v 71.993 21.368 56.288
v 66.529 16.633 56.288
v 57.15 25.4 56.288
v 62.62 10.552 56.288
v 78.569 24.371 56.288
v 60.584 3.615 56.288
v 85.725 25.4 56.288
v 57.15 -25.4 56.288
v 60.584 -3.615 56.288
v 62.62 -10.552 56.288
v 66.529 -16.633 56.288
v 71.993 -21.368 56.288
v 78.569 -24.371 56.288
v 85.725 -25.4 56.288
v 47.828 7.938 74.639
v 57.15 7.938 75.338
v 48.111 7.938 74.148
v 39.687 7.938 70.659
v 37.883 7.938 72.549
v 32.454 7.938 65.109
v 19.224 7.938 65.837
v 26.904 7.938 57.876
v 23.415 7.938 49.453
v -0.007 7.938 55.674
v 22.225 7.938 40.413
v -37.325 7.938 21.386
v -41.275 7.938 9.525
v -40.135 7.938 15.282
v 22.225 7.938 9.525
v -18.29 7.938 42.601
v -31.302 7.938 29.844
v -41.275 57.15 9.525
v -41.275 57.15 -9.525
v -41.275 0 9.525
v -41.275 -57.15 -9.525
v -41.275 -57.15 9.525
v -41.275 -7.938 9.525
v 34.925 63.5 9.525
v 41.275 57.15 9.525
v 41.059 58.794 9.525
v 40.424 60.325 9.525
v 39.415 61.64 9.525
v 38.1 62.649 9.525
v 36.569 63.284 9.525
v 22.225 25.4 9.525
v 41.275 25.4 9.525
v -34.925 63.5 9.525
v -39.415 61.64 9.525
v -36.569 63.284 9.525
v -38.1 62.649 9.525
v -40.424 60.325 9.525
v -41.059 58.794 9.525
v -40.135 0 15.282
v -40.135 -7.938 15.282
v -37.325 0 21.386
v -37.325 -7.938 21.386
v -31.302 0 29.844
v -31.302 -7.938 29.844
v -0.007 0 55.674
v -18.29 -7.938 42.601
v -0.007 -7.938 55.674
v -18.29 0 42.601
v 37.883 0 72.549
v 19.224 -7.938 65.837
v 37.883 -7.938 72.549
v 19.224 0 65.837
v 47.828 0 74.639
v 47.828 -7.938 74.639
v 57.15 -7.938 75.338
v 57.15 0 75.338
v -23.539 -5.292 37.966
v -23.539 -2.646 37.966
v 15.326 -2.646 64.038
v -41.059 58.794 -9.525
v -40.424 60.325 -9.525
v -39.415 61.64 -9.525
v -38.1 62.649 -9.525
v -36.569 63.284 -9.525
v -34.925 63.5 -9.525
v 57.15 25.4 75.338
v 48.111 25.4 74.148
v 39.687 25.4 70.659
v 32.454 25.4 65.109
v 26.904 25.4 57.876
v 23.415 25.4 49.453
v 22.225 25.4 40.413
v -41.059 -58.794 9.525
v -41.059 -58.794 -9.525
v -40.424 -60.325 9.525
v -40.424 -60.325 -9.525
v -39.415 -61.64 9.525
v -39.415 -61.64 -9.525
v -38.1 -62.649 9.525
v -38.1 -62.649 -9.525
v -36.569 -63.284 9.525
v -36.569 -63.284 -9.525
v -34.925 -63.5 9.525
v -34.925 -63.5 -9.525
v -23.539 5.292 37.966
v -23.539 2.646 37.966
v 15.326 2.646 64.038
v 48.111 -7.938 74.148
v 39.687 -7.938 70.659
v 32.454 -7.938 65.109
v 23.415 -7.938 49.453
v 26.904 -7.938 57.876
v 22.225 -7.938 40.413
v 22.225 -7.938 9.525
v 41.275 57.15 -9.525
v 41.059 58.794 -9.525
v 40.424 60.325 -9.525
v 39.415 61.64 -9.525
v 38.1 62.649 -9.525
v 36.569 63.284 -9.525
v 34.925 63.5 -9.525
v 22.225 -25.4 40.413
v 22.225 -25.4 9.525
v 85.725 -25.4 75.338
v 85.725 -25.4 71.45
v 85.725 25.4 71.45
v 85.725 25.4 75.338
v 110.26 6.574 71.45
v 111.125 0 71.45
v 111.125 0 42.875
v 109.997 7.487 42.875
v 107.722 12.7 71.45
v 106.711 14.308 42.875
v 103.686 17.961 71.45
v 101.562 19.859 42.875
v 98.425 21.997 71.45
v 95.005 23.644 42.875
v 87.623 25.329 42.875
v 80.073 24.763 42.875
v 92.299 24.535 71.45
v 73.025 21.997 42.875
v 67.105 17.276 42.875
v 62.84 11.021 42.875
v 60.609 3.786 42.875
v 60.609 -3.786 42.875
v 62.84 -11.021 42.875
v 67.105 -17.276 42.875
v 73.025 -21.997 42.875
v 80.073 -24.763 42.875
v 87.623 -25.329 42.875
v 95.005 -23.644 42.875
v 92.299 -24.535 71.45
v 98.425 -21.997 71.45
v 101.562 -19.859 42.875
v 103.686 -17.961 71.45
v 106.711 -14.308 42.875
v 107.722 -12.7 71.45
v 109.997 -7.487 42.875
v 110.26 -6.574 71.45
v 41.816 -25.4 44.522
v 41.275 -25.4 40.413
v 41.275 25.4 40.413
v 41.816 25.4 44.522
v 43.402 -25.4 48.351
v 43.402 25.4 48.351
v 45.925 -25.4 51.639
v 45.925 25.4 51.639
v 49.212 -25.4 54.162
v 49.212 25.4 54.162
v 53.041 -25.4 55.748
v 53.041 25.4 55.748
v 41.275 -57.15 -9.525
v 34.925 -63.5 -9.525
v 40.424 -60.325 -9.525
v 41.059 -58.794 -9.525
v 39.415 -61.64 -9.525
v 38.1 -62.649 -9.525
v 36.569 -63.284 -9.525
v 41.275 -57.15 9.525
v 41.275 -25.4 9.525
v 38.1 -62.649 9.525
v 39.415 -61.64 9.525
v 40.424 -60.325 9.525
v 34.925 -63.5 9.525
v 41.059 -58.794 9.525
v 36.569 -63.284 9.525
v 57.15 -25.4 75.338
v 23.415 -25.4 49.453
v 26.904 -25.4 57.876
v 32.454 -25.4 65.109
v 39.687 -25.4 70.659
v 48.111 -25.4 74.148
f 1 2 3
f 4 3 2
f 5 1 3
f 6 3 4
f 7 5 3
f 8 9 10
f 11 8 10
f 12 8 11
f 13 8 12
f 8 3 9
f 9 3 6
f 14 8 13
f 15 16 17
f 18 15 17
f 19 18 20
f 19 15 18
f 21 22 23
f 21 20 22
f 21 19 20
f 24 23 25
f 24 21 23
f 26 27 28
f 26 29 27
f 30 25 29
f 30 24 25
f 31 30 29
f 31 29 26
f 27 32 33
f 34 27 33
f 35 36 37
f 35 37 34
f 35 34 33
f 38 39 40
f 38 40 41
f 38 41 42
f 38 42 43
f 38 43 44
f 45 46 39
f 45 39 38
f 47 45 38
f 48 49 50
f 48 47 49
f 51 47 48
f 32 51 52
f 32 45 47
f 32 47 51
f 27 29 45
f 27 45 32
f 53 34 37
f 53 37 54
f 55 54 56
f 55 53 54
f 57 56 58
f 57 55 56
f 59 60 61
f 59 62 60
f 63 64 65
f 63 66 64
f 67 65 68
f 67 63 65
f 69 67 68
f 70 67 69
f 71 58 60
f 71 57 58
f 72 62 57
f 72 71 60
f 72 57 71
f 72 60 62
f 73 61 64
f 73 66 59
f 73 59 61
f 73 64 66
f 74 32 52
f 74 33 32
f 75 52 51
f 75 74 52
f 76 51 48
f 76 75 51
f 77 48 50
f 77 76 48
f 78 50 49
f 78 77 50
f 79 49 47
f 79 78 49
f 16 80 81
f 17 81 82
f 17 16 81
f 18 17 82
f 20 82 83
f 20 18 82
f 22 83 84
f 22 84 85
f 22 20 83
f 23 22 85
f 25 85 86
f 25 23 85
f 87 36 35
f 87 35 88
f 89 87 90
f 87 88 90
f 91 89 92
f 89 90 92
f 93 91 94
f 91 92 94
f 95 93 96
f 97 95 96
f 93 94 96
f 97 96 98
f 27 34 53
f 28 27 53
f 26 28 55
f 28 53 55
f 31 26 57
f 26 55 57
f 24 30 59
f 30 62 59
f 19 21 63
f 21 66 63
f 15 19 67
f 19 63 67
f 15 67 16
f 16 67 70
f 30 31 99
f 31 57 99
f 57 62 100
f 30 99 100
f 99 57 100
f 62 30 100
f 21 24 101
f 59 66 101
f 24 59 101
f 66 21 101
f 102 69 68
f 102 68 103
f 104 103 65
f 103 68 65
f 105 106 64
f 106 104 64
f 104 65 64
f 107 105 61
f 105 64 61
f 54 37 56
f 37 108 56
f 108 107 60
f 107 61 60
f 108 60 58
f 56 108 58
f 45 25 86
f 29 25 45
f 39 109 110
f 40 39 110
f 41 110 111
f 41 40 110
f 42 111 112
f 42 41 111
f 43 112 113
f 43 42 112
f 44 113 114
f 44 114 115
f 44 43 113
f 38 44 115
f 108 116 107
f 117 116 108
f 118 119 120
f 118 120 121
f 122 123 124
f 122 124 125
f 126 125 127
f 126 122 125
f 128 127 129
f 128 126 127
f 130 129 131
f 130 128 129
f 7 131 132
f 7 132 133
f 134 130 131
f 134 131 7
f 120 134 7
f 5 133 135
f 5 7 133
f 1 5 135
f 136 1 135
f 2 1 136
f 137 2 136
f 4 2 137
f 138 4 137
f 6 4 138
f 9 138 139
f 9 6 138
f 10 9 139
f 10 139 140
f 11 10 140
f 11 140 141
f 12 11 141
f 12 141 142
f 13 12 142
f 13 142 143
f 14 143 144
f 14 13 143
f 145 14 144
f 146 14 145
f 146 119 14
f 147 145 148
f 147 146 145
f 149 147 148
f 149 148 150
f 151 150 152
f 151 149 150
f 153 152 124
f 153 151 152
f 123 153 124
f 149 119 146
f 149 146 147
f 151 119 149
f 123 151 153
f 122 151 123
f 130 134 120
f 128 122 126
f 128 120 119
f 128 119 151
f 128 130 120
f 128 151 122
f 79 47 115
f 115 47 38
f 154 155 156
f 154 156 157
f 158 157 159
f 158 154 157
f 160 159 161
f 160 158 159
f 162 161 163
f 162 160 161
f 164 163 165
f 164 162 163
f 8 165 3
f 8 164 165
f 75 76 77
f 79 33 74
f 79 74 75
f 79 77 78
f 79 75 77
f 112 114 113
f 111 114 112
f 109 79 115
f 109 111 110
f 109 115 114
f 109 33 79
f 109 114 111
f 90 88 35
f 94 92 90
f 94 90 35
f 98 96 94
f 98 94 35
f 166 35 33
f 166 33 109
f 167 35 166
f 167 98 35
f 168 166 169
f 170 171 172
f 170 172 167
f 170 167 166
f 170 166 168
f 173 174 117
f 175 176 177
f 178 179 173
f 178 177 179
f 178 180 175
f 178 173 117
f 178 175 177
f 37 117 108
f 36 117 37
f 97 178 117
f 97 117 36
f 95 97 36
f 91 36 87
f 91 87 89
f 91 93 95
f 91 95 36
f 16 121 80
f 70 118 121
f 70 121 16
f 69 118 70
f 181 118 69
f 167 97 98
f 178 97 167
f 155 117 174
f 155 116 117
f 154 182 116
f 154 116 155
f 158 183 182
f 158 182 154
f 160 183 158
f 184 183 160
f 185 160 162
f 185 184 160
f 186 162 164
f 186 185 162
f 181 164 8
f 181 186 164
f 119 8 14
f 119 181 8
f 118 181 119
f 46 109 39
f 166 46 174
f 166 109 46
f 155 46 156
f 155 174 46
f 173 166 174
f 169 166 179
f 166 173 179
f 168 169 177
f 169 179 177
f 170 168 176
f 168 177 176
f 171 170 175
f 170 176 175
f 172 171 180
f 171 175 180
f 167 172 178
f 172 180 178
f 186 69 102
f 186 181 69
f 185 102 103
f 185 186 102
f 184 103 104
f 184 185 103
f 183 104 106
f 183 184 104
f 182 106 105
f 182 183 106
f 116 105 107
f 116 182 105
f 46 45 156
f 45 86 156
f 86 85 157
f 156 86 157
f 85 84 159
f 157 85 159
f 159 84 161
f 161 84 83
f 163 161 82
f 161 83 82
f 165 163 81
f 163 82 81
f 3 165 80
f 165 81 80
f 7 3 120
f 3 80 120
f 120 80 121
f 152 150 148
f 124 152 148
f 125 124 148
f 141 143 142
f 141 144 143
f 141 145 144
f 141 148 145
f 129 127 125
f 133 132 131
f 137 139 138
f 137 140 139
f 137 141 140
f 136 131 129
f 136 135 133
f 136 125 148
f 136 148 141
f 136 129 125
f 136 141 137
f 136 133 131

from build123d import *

# Parameters (mm, degrees)
F1_DEPTH = 63.5
F0_W     = 25.4
F0_H     = 15.1617553278
F2_DEPTH = 25.4
F3_DEPTH = 7.9375
F5_R     = 6.35


with BuildPart() as f1:
    # F0 (on Front) → F1 (new body, symmetric)
    with BuildSketch(Plane.XZ):
        Polygon((-41.275, 9.525), (-41.275, -9.525), (41.275, -9.525), (41.275, 9.525), (22.225, 9.525), align=None)
    extrude(amount=F1_DEPTH, both=True)

    # F0 (on Front) → F2 (join, symmetric)
    with BuildSketch(Plane.XZ):
        with BuildLine():
            Line((22.225, 9.525), (41.275, 9.525))
            Line((41.275, 9.525), (41.275, 40.4134446722))
            ThreePointArc((41.275, 40.4134446722), (45.9246798487, 51.6387648236), (57.15, 56.2884446722))
            Line((57.15, 56.2884446722), (60.325, 56.2884446722))
            Line((60.325, 56.2884446722), (60.325, 71.4502))
            Line((60.325, 71.4502), (85.725, 71.4502))
            Line((85.725, 71.4502), (85.725, 75.3384446722))
            Line((85.725, 75.3384446722), (57.15, 75.3384446722))
            ThreePointArc((57.15, 75.3384446722), (32.4542956671, 65.1091490052), (22.225, 40.4134446722))
            Line((22.225, 40.4134446722), (22.225, 9.525))
        make_face()
        with Locations((73.025, 63.8693223361)):
            Rectangle(F0_W, F0_H)
    extrude(amount=F2_DEPTH, both=True)

    # F0 (on Front) → F3 (join, symmetric)
    with BuildSketch(Plane.XZ):
        with BuildLine():
            add(Edge.make_bspline(
                [(-41.275, 9.525), (-40.1609577239, 35.0168719888), (19.9037119746, 75.5567997694), (57.15, 75.3384446722)],
                knots=[0, 0, 0, 0, 118.4013940992, 118.4013940992, 118.4013940992, 118.4013940992], degree=3))
            Line((-41.275, 9.525), (22.225, 9.525))
            Line((22.225, 9.525), (22.225, 40.4134446722))
            ThreePointArc((22.225, 40.4134446722), (32.4542956671, 65.1091490052), (57.15, 75.3384446722))
        make_face()
    extrude(amount=F3_DEPTH, both=True)

    # F0 (on Front) → F4 (revolve)
    with BuildSketch(Plane.XZ):
        Polygon((111.125, 71.4502), (85.725, 71.4502), (85.725, 56.2884446722), (85.725, 42.8752), (111.125, 42.8752), align=None)
    revolve(axis=Axis((85.725, 0, 59.1068223361), (0, 0, 1)))

    # F5
    f5_edges = [f1.edges().sort_by_distance(p)[0] for p in [
        (41.275, -63.5, 0),
        (-41.275, -63.5, 0),
        (-41.275, 63.5, 0),
        (41.275, 63.5, 0),
    ]]
    fillet(f5_edges, radius=F5_R)


solid = f1.part
